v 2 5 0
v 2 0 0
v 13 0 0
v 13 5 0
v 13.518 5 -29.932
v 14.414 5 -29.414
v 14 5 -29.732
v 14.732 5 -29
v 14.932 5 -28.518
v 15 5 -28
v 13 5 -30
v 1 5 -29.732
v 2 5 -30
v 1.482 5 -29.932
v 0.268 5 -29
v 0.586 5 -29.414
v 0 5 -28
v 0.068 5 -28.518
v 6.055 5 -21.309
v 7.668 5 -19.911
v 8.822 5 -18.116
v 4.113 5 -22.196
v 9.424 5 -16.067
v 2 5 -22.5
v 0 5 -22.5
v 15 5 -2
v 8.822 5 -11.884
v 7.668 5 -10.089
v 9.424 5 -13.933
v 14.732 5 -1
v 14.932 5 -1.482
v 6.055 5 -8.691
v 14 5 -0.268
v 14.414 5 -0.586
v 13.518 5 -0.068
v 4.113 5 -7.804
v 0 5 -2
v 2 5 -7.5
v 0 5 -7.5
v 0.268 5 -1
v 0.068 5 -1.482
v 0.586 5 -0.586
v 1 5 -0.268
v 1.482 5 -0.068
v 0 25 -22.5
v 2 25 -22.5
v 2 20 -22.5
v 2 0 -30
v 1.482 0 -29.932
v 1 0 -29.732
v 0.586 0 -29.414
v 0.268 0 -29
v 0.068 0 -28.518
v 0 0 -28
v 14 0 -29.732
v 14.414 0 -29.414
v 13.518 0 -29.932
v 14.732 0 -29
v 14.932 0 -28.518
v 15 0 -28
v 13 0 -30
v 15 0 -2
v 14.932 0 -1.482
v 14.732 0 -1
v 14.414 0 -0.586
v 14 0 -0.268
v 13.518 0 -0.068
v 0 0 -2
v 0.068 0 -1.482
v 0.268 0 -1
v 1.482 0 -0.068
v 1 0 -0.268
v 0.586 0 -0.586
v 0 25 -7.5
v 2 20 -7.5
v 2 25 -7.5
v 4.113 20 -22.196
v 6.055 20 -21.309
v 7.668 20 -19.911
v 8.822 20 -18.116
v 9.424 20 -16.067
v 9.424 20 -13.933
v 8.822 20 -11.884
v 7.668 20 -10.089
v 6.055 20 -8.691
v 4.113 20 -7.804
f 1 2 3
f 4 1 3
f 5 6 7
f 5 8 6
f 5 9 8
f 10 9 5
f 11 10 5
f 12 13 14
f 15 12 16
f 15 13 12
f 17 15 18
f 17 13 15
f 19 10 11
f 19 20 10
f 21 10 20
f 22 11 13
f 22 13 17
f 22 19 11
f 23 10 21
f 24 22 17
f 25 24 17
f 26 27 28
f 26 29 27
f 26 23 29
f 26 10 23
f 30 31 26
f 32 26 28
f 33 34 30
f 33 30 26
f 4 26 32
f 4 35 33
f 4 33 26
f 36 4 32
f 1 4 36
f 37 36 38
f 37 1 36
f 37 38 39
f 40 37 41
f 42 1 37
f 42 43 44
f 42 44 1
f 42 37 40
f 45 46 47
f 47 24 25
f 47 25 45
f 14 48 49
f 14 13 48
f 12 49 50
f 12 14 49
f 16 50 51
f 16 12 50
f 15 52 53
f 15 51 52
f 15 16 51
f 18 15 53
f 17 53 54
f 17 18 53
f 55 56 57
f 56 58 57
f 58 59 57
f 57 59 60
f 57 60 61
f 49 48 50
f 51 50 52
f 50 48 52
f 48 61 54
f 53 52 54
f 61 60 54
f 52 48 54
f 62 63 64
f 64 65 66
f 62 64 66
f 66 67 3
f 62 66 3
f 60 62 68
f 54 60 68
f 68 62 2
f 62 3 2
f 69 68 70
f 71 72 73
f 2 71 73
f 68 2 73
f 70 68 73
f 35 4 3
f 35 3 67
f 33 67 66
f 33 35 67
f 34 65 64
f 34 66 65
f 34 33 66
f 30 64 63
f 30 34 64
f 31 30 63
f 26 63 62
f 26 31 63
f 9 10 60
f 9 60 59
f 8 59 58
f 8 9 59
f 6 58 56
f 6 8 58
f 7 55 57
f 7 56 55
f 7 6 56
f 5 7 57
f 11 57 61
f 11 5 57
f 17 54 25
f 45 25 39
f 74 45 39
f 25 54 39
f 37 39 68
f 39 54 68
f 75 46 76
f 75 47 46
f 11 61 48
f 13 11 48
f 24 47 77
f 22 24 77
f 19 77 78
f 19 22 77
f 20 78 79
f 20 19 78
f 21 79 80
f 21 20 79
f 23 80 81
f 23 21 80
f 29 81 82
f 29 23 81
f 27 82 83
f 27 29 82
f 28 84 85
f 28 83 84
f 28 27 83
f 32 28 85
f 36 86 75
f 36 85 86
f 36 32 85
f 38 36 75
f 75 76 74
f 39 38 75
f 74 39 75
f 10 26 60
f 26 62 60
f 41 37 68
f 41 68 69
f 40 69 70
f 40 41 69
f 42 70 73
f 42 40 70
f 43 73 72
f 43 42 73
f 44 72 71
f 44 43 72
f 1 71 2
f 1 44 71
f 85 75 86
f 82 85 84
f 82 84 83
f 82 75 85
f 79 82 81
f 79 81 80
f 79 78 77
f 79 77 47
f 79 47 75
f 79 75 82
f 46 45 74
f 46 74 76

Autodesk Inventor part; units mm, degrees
ref_plane "YZ Plane" through (0, 0, 0) normal (1, 0, 0) x (0, 1, 0)
ref_plane "XZ Plane" through (0, 0, 0) normal (0, 1, 0) x (-1, 0, 0)
ref_plane "XY Plane" through (0, 0, 0) normal (0, 0, 1) x (1, 0, 0)
sketch "草圖1" plane through (0, 0, 0) normal (0, 1, 0) x (-1, 0, 0)
  line L0 (0, 0) -> (-15, 0)
  line L1 (-15, 0) -> (-15, -30)
  line L2 (-15, -30) -> (0, -30)
  line L3 (0, -30) -> (0, 0)
  dimension "d0" = 15
  dimension "d1" = 30
extrude "擠出1" add sketch "草圖1" along normal blind 5
fillet "圓角1" radius 2 4 edges at (15, 2.5, 0) (15, 2.5, -30) (0, 2.5, 0) (0, 2.5, -30)
sketch "草圖2" plane through (0, 5, 0) normal (0, 1, 0) x (1, 0, 0)
  line L0 (13, 30) -> (2, 30) projected
  line L1 (0, 28) -> (0, 2) projected
  line L2 (2, 30) -> (2, 15)
  arc A0 (2, 7.5) -> (2, 22.5) centre (2, 15) ccw
  line L3 (2, 15) -> (2, 7.5)
  line L4 (2, 15) -> (2, 22.5)
  line L5 (2, 22.5) -> (0, 22.5)
  line L6 (2, 7.5) -> (0, 7.5)
  line L7 (0, 22.5) -> (0, 7.5)
  point P0 (0, 0)
  dimension "d8" = 15
  dimension "d9" = 15
extrude "擠出3" add sketch "草圖2" along normal blind 15 contours A0 L3 L2
extrude "擠出4" add sketch "草圖2" along normal blind 20 contours L5 L2 L3 L6 L1
properties part number "孔1"
